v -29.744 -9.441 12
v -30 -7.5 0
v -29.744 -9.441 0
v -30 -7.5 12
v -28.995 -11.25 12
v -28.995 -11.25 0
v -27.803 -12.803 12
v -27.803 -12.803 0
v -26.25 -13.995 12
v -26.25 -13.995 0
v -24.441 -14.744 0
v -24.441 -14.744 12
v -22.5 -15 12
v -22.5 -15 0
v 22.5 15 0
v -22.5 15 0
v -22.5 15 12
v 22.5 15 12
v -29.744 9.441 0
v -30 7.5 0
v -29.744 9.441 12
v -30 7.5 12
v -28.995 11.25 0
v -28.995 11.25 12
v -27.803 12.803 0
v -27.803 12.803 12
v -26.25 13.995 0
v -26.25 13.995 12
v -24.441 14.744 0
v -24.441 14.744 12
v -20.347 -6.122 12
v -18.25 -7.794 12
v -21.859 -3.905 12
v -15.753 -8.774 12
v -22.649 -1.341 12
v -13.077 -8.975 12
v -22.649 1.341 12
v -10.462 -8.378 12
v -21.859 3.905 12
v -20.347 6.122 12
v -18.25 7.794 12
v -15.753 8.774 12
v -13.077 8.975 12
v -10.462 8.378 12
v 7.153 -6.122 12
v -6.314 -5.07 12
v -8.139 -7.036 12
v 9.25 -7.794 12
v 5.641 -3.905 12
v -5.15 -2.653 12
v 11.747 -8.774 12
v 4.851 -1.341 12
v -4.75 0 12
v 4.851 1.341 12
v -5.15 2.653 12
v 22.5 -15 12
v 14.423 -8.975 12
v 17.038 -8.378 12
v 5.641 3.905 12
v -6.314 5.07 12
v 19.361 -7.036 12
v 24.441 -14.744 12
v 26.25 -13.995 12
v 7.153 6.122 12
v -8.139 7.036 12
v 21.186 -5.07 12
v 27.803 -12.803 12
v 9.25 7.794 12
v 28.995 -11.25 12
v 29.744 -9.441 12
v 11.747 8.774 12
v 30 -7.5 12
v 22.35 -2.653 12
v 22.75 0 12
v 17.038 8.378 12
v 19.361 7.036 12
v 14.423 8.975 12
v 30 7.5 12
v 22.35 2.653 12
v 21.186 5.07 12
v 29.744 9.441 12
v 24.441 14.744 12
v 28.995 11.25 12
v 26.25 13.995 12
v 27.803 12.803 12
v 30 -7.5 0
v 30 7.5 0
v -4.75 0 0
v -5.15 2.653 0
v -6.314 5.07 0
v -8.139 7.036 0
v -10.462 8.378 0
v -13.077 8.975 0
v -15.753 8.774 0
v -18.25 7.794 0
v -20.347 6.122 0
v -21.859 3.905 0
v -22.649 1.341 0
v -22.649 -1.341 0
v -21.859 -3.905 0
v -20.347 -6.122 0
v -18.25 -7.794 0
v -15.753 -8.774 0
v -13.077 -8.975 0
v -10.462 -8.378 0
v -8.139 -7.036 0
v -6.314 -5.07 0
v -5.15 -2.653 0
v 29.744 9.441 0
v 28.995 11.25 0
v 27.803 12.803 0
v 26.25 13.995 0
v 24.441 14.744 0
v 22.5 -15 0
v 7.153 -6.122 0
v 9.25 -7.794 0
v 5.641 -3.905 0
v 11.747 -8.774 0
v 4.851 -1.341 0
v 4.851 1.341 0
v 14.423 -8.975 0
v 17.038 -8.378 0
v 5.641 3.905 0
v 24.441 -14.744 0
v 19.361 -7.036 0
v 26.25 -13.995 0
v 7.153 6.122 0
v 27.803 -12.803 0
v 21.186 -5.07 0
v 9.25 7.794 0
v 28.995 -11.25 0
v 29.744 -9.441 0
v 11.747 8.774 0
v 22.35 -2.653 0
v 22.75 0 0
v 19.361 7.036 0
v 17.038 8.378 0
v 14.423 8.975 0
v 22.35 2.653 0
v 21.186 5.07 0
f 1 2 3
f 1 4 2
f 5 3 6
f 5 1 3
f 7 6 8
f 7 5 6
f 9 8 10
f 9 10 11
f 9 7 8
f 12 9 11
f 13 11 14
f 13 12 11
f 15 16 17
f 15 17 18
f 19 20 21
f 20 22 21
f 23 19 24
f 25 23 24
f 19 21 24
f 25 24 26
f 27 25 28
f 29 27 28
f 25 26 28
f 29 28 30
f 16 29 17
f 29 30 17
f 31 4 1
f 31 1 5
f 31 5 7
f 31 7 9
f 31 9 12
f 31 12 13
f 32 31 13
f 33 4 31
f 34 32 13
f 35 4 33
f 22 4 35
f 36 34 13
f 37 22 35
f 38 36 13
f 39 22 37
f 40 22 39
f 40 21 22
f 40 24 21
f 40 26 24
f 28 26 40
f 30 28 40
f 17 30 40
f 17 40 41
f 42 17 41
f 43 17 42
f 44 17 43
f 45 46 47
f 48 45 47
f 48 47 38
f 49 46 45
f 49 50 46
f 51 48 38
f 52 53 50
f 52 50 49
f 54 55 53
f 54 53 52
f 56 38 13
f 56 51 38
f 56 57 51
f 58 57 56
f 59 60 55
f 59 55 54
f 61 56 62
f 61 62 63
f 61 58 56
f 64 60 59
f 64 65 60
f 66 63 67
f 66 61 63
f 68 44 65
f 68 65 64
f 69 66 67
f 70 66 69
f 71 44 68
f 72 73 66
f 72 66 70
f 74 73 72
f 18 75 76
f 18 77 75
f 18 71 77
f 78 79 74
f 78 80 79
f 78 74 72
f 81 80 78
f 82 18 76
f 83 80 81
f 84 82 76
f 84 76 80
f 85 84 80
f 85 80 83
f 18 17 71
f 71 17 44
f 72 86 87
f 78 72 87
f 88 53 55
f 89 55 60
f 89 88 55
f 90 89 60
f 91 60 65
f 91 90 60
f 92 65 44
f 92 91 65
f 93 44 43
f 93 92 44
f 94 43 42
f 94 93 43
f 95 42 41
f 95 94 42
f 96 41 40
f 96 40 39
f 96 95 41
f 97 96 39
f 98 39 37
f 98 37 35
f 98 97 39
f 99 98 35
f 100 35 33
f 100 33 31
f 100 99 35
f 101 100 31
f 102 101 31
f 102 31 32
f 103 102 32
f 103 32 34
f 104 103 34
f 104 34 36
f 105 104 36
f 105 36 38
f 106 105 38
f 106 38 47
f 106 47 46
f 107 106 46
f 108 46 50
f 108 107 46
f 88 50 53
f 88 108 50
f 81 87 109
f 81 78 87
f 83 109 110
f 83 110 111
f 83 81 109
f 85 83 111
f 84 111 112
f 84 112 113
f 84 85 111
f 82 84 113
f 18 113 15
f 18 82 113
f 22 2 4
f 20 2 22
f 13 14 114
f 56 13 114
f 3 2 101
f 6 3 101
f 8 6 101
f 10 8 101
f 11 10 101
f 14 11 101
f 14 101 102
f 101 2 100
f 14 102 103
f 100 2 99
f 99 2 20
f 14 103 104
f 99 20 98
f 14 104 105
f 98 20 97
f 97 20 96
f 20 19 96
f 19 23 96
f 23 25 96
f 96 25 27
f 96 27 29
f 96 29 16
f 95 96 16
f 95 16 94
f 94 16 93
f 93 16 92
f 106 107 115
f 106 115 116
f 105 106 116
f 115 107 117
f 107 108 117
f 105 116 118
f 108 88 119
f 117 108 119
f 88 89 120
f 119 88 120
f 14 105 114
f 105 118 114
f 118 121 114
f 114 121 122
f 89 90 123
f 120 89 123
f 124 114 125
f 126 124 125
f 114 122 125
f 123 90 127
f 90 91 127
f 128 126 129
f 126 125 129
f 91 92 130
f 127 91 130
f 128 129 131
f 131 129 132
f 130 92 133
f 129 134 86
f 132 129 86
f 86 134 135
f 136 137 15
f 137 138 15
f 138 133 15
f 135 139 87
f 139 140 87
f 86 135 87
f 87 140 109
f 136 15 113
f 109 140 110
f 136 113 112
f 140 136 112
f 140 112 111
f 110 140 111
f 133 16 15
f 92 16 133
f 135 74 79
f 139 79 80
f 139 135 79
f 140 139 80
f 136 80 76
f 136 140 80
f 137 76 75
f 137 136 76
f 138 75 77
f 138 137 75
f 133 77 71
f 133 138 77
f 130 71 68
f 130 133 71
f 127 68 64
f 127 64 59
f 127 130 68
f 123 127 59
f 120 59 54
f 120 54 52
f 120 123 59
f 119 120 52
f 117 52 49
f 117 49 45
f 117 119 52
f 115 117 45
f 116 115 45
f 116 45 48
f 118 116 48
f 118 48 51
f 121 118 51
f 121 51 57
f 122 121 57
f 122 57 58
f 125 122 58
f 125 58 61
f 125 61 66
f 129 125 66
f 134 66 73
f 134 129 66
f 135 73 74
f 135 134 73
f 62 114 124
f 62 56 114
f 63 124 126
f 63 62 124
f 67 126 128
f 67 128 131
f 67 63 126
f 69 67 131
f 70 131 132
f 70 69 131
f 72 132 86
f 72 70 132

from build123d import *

# Parameters (mm, degrees)
F0_W     = 60
F0_H     = 30
F0_R     = 9
F1_DEPTH = 12
F2_R     = 7.5
F3_R     = 7.5
F4_R     = 7.5
F5_R     = 7.5


with BuildPart() as f1:
    # F0 (on Top) → F1 (new body)
    with BuildSketch(Plane.XY):
        Rectangle(F0_W, F0_H)
        with Locations((-13.75, 0)):
            Circle(F0_R, mode=Mode.SUBTRACT)
        with Locations((13.75, 0)):
            Circle(F0_R, mode=Mode.SUBTRACT)
    extrude(amount=F1_DEPTH)

    # F2
    f2_edges = [f1.edges().sort_by_distance(p)[0] for p in [
        (-30, -15, 6),
    ]]
    fillet(f2_edges, radius=F2_R)

    # F3
    f3_edges = [f1.edges().sort_by_distance(p)[0] for p in [
        (-30, 15, 6),
    ]]
    fillet(f3_edges, radius=F3_R)

    # F4
    f4_edges = [f1.edges().sort_by_distance(p)[0] for p in [
        (30, -15, 6),
    ]]
    fillet(f4_edges, radius=F4_R)

    # F5
    f5_edges = [f1.edges().sort_by_distance(p)[0] for p in [
        (30, 15, 6),
    ]]
    fillet(f5_edges, radius=F5_R)


solid = f1.part
